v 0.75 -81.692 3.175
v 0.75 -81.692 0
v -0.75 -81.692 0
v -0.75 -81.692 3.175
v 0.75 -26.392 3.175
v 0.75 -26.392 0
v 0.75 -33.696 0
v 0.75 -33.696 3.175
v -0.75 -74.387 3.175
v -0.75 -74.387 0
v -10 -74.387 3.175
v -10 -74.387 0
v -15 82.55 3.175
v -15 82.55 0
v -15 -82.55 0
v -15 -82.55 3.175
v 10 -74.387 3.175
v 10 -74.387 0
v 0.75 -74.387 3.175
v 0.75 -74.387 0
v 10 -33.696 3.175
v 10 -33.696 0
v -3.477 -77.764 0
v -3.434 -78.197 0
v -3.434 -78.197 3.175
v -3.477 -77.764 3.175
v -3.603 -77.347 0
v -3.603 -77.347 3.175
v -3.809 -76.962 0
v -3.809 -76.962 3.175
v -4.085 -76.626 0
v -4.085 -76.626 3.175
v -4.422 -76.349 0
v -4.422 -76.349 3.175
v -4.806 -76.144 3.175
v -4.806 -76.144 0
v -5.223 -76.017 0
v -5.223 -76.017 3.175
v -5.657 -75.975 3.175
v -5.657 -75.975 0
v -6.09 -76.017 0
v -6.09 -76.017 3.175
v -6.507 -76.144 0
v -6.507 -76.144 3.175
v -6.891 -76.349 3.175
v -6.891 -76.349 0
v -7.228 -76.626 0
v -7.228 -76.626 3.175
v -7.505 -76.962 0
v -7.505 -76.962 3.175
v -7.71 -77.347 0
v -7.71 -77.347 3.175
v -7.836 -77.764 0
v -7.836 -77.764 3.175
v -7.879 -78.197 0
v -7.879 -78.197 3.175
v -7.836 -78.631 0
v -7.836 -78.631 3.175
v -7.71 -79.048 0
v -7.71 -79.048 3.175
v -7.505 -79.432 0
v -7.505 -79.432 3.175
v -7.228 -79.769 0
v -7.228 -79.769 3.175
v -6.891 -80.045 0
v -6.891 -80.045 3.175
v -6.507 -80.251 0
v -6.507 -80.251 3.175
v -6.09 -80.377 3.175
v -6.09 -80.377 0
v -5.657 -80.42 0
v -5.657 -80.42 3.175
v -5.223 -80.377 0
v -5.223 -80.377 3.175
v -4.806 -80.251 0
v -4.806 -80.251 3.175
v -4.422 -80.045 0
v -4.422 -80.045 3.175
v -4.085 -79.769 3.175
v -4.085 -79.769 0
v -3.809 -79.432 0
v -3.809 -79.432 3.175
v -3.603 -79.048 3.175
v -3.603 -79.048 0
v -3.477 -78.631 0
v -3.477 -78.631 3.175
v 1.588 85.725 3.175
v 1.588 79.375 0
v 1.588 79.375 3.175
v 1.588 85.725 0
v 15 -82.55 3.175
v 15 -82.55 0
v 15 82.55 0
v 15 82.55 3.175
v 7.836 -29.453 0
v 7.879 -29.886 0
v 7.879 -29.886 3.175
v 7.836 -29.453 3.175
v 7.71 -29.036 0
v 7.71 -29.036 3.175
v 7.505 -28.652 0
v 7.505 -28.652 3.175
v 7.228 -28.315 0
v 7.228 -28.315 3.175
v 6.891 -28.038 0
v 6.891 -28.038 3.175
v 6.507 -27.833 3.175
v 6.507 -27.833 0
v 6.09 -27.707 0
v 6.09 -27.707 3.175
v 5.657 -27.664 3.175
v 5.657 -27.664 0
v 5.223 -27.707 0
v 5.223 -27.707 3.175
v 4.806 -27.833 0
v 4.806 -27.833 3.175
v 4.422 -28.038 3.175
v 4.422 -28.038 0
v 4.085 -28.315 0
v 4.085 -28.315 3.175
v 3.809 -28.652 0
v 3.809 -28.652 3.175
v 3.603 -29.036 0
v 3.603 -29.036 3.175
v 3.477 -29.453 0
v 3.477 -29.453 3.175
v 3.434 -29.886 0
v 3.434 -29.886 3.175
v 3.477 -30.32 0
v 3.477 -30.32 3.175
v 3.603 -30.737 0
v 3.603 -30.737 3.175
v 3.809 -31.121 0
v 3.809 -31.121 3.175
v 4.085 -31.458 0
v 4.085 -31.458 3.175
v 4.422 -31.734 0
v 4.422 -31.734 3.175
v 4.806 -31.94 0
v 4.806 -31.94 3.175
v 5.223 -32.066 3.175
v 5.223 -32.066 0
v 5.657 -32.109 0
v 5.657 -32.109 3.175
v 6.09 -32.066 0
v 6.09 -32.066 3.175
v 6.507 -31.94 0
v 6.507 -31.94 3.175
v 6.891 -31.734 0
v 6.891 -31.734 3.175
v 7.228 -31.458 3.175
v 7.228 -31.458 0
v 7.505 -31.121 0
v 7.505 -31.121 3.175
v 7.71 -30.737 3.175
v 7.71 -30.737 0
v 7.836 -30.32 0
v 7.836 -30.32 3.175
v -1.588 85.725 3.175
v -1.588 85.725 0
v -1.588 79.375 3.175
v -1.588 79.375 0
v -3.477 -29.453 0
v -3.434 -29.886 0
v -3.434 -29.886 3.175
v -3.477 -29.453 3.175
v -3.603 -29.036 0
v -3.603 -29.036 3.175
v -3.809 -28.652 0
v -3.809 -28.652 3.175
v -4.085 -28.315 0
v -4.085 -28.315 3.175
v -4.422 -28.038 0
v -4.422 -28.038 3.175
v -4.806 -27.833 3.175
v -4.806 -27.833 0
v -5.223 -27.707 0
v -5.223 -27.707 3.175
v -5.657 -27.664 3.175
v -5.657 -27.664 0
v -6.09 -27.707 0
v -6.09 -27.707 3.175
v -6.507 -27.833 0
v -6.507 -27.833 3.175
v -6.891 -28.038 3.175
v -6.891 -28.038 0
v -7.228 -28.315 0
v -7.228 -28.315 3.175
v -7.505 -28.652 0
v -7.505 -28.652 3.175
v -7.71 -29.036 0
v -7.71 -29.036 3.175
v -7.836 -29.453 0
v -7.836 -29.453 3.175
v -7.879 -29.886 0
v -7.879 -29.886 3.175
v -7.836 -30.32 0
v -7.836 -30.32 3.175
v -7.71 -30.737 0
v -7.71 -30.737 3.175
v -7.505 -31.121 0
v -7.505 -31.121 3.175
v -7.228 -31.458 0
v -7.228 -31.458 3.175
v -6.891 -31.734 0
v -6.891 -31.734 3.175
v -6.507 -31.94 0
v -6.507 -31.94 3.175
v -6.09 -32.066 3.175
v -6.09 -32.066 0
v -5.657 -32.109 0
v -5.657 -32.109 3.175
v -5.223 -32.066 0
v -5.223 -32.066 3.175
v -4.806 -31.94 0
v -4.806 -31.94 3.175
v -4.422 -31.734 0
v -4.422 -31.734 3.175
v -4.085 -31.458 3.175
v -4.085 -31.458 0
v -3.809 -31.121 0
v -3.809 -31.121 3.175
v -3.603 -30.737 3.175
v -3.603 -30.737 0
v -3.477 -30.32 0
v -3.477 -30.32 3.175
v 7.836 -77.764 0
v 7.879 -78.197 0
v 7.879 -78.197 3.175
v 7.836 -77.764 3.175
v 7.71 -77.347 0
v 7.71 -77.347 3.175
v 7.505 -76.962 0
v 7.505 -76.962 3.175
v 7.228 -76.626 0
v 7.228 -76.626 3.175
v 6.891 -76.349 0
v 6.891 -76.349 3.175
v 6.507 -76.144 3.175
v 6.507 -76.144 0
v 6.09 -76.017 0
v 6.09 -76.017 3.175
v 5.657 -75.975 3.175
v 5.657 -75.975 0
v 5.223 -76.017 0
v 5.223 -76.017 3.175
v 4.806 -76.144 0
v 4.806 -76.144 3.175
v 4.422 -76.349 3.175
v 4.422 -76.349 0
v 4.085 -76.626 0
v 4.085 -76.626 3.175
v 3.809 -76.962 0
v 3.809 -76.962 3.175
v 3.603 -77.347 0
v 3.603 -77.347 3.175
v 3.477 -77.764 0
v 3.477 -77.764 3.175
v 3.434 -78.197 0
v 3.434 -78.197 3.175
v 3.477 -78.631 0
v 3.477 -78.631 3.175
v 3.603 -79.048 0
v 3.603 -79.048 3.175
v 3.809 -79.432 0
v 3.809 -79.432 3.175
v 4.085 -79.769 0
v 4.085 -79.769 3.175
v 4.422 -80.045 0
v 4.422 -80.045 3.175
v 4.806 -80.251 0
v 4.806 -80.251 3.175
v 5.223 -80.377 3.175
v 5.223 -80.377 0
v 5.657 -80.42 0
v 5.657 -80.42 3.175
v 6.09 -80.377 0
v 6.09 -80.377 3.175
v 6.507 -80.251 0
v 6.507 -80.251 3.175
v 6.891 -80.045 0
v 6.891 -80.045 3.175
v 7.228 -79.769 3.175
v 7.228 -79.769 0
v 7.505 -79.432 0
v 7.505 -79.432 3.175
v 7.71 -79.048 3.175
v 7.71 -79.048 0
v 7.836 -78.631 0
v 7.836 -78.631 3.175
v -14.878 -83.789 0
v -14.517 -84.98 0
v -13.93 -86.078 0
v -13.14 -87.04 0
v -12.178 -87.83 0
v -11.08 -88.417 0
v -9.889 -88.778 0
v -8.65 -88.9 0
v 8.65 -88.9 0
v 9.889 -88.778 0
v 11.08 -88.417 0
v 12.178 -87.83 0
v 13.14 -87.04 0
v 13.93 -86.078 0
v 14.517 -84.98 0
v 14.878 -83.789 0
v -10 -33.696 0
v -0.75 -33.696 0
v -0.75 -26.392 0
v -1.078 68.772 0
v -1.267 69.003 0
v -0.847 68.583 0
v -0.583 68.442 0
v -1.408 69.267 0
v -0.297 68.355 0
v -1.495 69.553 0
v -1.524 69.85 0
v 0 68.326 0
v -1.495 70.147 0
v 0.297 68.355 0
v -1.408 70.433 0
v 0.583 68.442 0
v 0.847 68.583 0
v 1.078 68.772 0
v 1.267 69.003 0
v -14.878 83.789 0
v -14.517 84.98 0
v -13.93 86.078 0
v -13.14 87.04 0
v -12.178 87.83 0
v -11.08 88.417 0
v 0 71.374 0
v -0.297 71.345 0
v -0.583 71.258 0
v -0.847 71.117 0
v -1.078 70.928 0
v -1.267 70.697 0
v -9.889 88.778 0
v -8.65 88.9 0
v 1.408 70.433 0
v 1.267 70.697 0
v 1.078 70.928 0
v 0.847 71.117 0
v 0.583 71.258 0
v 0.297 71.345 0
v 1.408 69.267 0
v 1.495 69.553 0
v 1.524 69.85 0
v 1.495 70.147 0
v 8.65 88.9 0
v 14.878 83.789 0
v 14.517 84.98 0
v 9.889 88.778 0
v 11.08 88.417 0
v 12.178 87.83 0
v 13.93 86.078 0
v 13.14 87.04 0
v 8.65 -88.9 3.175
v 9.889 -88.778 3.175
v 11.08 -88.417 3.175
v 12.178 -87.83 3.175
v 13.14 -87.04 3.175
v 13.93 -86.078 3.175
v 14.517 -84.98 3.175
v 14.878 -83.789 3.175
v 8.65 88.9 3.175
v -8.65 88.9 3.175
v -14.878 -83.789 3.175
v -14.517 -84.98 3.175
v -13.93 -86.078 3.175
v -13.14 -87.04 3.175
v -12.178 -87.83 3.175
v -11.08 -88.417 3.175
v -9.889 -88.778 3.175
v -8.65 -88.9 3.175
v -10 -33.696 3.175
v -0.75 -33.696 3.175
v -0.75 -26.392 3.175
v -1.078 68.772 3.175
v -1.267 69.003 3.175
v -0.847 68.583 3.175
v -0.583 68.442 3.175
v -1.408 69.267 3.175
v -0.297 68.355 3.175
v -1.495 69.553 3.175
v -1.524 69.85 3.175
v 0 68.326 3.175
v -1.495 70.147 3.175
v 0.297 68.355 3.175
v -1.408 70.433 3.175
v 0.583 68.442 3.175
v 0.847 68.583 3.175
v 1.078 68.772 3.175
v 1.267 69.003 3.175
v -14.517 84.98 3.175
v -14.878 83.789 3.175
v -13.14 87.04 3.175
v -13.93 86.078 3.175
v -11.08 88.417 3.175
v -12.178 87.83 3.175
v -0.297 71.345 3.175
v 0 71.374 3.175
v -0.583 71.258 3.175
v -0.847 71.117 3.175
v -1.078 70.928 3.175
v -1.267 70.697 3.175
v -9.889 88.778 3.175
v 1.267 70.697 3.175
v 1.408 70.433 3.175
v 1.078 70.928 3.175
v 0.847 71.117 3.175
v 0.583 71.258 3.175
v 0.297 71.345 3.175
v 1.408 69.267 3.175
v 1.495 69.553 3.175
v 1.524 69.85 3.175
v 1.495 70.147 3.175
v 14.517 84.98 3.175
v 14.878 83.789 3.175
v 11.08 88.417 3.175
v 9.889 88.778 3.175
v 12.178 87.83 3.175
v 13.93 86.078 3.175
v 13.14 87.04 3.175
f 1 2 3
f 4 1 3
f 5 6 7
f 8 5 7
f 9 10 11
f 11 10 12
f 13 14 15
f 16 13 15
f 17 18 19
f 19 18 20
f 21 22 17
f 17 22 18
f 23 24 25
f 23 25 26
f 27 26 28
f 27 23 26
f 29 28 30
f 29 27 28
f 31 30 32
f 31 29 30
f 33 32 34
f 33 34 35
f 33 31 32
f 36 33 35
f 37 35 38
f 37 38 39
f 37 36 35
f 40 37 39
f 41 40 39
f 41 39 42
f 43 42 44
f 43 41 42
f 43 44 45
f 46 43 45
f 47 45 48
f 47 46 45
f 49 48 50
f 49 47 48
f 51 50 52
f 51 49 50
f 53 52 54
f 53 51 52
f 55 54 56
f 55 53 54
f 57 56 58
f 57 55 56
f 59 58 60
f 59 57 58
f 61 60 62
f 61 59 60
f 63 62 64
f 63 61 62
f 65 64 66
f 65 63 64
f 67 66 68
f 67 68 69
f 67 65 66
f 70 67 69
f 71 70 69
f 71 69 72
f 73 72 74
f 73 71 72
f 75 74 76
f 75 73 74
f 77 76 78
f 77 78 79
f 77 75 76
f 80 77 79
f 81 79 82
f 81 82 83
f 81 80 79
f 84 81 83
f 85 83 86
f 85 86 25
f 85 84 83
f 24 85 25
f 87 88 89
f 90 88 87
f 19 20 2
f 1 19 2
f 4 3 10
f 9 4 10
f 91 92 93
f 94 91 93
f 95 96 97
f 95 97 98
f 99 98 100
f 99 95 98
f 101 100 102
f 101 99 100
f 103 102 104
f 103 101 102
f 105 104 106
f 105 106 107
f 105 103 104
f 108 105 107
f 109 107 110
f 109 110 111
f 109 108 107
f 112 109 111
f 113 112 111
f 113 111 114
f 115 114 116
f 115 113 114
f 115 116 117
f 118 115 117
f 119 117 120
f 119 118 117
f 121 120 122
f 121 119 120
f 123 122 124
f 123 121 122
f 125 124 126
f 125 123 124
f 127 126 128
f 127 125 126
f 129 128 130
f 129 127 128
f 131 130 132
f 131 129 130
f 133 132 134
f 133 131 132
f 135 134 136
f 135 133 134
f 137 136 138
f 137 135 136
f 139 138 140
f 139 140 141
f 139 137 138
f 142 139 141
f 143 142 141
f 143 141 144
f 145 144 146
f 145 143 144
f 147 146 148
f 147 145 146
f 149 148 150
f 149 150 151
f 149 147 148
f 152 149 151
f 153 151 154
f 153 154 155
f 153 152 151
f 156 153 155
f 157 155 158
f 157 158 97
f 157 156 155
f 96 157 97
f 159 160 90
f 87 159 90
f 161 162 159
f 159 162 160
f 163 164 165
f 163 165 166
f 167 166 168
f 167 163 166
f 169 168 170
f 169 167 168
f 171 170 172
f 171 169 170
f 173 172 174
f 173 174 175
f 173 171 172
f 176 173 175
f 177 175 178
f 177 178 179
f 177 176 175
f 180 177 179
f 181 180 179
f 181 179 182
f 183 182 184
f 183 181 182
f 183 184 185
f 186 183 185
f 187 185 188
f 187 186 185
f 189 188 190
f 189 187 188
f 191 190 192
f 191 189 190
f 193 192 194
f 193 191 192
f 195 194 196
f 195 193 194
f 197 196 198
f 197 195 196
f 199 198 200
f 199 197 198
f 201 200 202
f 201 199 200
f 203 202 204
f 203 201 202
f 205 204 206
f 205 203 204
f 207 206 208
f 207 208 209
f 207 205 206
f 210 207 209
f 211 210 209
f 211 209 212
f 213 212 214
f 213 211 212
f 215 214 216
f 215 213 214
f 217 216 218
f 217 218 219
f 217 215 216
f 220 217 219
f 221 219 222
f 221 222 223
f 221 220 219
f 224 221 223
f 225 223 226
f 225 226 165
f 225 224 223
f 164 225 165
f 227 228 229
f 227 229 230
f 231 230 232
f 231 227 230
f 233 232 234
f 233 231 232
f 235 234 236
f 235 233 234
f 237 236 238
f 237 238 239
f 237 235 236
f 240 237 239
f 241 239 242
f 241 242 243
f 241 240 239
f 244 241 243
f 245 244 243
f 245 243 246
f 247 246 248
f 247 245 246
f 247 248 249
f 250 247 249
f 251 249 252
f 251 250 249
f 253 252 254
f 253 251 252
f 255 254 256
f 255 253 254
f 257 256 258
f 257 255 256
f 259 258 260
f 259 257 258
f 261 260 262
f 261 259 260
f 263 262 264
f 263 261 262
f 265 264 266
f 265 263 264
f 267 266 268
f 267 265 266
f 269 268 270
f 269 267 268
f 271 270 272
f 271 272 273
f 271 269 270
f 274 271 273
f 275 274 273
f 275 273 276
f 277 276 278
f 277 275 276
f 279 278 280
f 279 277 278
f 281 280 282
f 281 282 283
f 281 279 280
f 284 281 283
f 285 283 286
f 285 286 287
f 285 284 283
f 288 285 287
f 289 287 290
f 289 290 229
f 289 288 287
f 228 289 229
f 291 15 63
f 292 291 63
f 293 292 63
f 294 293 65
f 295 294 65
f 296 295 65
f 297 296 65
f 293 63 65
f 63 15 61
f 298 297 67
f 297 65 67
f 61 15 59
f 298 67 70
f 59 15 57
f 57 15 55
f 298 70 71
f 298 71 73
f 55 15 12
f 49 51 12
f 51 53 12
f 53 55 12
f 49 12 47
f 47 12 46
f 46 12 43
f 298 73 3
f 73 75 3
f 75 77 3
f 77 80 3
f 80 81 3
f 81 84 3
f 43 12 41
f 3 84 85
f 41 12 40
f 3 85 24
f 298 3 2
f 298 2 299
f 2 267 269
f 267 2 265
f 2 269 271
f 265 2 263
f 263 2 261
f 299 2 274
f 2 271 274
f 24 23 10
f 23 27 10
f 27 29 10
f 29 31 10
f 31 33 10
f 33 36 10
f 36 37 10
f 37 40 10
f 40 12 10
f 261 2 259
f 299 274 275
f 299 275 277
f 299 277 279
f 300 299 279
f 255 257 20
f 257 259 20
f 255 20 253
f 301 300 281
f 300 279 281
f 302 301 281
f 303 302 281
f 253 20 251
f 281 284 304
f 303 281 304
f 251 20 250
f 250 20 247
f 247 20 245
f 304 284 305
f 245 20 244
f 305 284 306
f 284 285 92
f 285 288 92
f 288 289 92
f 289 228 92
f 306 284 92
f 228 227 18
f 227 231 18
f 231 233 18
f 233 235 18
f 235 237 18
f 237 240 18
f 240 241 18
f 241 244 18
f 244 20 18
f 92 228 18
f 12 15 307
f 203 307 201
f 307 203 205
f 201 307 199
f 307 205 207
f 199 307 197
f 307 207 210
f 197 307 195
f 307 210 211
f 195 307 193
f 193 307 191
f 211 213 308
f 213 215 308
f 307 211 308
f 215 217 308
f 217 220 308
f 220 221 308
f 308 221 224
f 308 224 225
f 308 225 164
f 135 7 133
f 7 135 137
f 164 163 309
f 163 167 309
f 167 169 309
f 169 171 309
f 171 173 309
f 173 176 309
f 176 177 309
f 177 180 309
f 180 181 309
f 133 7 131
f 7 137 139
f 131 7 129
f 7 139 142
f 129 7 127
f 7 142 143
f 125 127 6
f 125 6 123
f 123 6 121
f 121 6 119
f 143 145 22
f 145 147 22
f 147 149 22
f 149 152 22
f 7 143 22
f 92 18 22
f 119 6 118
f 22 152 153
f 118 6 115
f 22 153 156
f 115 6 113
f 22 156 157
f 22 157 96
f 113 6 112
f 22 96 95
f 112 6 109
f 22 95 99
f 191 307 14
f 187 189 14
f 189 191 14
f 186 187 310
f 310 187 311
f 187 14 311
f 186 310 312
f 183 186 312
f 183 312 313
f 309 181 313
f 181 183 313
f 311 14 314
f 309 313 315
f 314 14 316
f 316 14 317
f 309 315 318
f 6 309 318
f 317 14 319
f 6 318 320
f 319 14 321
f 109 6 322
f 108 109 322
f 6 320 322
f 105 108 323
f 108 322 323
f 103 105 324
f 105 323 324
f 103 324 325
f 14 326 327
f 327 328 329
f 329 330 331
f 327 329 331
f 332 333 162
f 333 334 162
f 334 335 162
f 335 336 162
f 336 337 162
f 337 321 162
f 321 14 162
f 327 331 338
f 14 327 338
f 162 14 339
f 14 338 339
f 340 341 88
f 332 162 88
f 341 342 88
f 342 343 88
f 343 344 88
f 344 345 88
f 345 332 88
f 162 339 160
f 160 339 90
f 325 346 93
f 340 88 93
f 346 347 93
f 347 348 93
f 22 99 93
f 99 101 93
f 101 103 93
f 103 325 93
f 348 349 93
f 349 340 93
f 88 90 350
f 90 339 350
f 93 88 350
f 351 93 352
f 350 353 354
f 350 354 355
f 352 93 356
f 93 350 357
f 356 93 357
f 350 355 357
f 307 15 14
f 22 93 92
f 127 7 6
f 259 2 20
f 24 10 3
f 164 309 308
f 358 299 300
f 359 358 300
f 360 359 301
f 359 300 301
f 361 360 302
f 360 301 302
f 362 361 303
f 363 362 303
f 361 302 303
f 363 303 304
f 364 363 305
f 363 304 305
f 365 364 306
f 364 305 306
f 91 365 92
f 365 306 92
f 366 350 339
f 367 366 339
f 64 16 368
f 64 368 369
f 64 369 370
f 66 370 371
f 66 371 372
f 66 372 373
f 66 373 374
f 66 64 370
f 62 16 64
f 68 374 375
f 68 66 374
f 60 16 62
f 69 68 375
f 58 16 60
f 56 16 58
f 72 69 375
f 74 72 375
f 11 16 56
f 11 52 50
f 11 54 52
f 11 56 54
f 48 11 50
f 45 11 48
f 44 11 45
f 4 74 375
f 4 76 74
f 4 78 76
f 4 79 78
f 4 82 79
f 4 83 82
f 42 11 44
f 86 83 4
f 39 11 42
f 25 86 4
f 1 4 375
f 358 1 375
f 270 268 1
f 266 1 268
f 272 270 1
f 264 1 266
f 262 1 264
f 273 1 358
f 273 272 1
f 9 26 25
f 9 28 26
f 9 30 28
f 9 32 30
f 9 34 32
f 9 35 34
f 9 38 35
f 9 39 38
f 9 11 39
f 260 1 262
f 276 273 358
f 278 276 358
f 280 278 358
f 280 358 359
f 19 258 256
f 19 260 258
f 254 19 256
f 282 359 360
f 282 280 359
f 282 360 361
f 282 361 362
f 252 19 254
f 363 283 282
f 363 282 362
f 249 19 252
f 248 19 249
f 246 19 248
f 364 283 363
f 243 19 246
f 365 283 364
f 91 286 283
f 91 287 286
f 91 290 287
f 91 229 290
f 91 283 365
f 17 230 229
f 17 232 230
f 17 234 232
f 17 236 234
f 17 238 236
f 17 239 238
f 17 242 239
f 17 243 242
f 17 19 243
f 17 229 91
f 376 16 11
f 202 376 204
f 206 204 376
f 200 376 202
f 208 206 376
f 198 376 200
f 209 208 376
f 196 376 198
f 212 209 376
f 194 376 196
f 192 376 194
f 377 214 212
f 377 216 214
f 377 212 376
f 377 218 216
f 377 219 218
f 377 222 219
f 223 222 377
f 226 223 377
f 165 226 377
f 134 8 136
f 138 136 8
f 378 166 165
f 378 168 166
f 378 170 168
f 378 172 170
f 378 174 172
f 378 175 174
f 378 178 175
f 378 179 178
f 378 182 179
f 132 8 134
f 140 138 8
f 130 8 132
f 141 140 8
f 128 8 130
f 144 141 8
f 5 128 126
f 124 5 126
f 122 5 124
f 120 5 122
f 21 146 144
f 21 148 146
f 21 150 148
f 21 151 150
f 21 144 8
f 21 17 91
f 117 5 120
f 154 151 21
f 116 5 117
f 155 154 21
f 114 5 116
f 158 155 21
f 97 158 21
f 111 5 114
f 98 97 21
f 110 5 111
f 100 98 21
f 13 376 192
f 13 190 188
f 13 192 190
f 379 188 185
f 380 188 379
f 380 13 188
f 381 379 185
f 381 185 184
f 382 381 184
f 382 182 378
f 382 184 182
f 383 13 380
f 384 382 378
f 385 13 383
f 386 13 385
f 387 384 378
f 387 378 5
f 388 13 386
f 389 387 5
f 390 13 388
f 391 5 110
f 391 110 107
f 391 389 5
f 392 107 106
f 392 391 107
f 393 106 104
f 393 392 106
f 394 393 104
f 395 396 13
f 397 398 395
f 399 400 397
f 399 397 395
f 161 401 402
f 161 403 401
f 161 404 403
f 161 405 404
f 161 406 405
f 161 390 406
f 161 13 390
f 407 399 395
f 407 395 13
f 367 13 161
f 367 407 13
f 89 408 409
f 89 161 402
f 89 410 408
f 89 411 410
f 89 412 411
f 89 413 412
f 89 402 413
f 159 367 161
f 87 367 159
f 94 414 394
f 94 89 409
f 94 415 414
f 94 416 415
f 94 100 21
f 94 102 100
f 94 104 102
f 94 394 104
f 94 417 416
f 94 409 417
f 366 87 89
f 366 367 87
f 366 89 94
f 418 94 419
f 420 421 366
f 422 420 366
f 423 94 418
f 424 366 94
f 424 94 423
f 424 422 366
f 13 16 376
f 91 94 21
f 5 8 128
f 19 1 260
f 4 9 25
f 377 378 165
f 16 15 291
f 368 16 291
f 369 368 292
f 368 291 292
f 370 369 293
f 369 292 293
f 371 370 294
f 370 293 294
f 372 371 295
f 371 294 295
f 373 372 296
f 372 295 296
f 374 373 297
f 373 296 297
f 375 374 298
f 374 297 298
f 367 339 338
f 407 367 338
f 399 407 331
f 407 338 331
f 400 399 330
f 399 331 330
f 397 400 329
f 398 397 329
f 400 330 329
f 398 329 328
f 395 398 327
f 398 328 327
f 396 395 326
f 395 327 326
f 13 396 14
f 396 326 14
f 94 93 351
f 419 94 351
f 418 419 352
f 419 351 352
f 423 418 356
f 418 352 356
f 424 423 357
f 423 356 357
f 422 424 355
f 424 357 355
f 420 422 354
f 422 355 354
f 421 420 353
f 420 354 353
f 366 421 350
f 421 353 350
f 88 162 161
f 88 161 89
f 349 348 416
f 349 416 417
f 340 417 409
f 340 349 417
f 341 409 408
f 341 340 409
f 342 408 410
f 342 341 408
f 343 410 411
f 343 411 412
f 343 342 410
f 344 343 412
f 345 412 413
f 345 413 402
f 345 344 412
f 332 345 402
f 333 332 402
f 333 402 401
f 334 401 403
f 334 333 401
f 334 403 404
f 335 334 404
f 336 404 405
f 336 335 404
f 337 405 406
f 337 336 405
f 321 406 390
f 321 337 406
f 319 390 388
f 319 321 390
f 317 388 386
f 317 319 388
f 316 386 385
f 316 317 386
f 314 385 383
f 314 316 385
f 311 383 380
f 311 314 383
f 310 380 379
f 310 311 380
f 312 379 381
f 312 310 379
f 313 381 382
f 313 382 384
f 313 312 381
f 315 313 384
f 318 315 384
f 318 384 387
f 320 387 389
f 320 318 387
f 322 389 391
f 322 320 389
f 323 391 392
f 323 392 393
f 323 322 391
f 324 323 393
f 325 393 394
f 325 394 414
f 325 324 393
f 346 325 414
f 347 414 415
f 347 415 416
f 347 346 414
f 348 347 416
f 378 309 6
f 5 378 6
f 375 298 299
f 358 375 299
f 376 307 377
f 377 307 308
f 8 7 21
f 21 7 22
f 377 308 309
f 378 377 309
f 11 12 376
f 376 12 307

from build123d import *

# Parameters (mm, degrees)
F0_R     = 2.2225
F0_R_2   = 1.524
F0_W     = 3.175
F0_H     = 6.35
F1_DEPTH = 3.175


# Not quite as in the source:
# - a length typed as a fraction of an inch, garbled in the dataset ("3 / 203.2 mm" for 3/8 in), is restored


with BuildPart() as f1:
    # F0 (on Top) → F1 (new body)
    with BuildSketch(Plane.XY):
        with BuildLine():
            ThreePointArc((15, 82.55), (13.1401280605, 87.0401280605), (8.65, 88.9))
            Line((8.65, 88.9), (-8.65, 88.9))
            ThreePointArc((-8.65, 88.9), (-13.1401280605, 87.0401280605), (-15, 82.55))
            Line((-15, 82.55), (-15, -82.55))
            ThreePointArc((-15, -82.55), (-13.1401280605, -87.0401280605), (-8.65, -88.9))
            Line((-8.65, -88.9), (8.65, -88.9))
            ThreePointArc((8.65, -88.9), (13.1401280605, -87.0401280605), (15, -82.55))
            Line((15, -82.55), (15, 82.55))
        make_face()
        with Locations((-5.6566, -78.197214059)):
            Circle(F0_R, mode=Mode.SUBTRACT)
        Polygon((0.75, -33.696414059), (10, -33.696414059), (10, -74.387214059), (0.75, -74.387214059), (0.75, -81.691814059), (-0.75, -81.691814059), (-0.75, -74.387214059), (-10, -74.387214059), (-10, -33.696414059), (-0.75, -33.696414059), (-0.75, -26.391814059), (0.75, -26.391814059), align=None, mode=Mode.SUBTRACT)
        with Locations((-5.6566, -29.886414059)):
            Circle(F0_R, mode=Mode.SUBTRACT)
        with Locations((5.6566, -78.197214059)):
            Circle(F0_R, mode=Mode.SUBTRACT)
        with Locations((5.6566, -29.886414059)):
            Circle(F0_R, mode=Mode.SUBTRACT)
        with Locations((0, 69.85)):
            Circle(F0_R_2, mode=Mode.SUBTRACT)
        with Locations((0, 82.55)):
            Rectangle(F0_W, F0_H, mode=Mode.SUBTRACT)
    extrude(amount=F1_DEPTH)


solid = f1.part
